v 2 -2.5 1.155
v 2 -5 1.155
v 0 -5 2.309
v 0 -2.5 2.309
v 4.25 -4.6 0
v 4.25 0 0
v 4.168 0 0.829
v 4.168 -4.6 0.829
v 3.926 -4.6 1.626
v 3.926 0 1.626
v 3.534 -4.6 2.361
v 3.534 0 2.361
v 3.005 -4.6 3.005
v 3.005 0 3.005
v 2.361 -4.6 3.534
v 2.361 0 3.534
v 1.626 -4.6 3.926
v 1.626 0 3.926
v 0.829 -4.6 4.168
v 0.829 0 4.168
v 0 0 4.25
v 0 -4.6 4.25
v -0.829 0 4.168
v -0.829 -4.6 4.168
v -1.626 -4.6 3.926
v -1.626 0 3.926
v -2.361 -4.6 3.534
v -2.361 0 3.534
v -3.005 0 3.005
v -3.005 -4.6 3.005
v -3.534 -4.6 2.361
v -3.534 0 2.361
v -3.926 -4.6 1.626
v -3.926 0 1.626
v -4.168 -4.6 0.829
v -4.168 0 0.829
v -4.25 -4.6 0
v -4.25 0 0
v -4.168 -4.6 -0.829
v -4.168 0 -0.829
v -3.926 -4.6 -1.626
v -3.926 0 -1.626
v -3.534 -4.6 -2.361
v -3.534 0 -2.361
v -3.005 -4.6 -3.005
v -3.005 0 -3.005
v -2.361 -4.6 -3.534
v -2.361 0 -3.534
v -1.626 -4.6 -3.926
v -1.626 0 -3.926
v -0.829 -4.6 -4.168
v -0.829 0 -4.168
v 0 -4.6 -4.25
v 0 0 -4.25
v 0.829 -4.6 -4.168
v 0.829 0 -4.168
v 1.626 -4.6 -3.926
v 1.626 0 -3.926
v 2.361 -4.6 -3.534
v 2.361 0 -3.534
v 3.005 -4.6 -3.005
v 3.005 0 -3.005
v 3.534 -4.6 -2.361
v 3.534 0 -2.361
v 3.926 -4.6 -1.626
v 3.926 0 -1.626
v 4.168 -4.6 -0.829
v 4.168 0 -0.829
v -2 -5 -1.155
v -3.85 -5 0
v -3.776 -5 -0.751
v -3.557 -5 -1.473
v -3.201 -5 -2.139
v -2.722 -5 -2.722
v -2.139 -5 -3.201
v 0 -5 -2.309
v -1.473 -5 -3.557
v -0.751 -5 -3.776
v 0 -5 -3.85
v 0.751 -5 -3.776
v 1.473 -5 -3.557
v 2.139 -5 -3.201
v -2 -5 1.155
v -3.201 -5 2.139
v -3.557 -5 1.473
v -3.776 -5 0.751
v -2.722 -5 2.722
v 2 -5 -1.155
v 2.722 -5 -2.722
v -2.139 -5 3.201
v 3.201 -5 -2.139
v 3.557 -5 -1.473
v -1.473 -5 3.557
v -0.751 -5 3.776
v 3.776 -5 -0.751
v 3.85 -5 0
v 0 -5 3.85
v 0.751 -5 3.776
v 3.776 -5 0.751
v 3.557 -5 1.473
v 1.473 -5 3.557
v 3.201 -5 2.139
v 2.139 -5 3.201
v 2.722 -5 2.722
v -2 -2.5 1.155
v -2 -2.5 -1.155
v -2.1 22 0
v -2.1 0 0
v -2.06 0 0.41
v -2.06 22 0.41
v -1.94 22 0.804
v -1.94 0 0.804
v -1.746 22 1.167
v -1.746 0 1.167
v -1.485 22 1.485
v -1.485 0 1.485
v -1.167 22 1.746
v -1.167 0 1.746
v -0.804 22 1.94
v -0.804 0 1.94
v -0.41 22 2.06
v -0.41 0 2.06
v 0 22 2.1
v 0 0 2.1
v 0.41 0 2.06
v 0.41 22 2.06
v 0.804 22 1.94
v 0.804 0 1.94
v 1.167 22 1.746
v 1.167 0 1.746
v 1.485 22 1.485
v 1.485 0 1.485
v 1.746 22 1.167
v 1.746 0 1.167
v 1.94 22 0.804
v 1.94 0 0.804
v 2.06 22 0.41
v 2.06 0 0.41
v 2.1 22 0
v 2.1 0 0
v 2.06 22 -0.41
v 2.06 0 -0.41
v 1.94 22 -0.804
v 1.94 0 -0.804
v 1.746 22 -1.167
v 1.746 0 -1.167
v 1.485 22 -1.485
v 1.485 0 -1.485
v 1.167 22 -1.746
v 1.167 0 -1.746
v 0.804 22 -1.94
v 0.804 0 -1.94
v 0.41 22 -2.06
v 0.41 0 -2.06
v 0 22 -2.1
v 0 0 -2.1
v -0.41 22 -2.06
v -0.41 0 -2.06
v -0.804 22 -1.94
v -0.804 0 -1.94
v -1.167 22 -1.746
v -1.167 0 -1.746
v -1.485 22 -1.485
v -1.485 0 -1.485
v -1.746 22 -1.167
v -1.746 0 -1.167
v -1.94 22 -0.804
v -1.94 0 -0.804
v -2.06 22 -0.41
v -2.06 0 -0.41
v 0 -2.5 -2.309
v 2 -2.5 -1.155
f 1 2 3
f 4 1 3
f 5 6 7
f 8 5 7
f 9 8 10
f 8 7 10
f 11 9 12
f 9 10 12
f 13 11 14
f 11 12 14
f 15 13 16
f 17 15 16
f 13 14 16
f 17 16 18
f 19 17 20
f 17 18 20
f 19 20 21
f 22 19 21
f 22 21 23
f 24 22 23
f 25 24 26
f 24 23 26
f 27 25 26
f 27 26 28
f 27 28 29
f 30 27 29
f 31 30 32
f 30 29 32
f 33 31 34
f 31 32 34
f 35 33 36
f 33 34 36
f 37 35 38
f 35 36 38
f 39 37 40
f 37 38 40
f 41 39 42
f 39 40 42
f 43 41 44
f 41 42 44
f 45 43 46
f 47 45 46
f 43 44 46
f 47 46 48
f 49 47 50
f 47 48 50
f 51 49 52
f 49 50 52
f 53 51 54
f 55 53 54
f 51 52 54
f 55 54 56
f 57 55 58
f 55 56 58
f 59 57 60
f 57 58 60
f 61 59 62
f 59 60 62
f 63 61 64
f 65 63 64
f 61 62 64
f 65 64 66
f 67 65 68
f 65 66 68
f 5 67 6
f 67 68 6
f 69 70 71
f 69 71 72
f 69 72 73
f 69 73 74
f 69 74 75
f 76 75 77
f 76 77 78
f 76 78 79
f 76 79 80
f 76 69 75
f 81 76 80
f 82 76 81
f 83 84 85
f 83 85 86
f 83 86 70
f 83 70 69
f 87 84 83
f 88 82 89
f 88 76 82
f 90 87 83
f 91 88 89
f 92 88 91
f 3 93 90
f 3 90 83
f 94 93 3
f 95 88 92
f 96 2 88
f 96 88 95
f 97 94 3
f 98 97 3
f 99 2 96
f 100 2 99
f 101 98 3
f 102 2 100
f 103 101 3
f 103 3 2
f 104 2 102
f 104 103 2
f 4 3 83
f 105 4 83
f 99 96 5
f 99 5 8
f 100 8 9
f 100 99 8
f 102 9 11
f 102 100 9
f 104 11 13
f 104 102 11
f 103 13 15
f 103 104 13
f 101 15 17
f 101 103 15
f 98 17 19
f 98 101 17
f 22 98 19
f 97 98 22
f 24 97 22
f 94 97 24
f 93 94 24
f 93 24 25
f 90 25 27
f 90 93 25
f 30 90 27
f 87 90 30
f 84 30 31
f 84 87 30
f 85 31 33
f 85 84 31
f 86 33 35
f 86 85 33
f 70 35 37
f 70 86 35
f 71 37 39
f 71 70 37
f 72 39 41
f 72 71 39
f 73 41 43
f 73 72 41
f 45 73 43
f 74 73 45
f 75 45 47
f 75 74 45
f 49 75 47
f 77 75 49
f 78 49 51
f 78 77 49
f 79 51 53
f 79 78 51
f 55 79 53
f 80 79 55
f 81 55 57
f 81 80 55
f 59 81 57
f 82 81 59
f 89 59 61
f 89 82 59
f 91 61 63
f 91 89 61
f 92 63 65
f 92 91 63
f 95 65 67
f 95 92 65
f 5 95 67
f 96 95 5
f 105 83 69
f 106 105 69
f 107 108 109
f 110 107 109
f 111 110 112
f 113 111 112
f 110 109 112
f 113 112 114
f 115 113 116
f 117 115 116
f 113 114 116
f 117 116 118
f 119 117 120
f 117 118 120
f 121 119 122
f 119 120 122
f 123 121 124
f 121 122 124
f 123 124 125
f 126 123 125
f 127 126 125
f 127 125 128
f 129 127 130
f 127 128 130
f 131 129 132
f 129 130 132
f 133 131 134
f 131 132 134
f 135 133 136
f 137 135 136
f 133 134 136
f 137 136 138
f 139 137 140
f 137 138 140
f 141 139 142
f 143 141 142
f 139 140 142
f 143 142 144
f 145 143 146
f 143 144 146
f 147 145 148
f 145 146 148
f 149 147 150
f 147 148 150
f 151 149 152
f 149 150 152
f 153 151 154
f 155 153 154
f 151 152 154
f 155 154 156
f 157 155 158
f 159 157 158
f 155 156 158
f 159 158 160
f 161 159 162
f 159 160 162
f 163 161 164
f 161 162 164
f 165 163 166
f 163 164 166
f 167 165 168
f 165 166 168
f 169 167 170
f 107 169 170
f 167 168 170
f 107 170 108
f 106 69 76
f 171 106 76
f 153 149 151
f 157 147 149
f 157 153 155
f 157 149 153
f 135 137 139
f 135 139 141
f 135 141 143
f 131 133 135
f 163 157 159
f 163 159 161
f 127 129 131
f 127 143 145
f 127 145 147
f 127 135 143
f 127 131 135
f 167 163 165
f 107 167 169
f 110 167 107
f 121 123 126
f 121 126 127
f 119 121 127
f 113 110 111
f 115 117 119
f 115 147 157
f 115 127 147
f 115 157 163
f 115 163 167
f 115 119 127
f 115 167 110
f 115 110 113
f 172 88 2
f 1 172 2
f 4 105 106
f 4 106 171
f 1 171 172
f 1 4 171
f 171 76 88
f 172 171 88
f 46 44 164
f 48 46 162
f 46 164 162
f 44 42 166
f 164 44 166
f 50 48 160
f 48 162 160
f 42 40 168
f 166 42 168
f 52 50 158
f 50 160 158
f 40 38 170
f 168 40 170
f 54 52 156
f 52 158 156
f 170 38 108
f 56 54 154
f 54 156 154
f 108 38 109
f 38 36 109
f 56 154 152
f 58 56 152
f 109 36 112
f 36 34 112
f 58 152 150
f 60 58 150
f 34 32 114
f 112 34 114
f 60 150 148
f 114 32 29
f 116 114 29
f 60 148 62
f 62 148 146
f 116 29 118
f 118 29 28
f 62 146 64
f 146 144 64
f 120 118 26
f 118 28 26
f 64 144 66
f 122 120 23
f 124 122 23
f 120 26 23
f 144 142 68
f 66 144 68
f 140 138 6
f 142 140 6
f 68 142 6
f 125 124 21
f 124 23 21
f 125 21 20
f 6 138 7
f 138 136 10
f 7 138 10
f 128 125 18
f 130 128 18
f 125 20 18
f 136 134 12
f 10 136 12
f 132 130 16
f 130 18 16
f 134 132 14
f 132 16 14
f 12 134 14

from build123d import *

# Parameters (mm, degrees)
F0_R     = 4.25
F1_DEPTH = 5
F2_R     = 2.1
F3_DEPTH = 22
F5_DEPTH = 2.5
F6_SIZE  = 0.4


with BuildPart() as f1:
    # F0 (on Front) → F1 (new body)
    with BuildSketch(Plane.XZ):
        Circle(F0_R)
    extrude(amount=F1_DEPTH)

    # F2 (on face) → F3 (join)
    with BuildSketch(Plane(origin=(0, 0, 0), x_dir=(-1, 0, 0), z_dir=(0, 1, 0))):
        Circle(F2_R)
    extrude(amount=F3_DEPTH)

    # F4 (on face) → F5 (cut)
    with BuildSketch(Plane.XZ.offset(5)):
        Polygon((0, -2.309401), (2, -1.154701), (2, 1.154701), (0, 2.309401), (-2, 1.154701), (-2, -1.154701), align=None)
    extrude(amount=-F5_DEPTH, mode=Mode.SUBTRACT)

    # F6
    f6_edges = [f1.edges().sort_by_distance(p)[0] for p in [
        (-4.25, -5, 0),
    ]]
    chamfer(f6_edges, length=F6_SIZE)


solid = f1.part
